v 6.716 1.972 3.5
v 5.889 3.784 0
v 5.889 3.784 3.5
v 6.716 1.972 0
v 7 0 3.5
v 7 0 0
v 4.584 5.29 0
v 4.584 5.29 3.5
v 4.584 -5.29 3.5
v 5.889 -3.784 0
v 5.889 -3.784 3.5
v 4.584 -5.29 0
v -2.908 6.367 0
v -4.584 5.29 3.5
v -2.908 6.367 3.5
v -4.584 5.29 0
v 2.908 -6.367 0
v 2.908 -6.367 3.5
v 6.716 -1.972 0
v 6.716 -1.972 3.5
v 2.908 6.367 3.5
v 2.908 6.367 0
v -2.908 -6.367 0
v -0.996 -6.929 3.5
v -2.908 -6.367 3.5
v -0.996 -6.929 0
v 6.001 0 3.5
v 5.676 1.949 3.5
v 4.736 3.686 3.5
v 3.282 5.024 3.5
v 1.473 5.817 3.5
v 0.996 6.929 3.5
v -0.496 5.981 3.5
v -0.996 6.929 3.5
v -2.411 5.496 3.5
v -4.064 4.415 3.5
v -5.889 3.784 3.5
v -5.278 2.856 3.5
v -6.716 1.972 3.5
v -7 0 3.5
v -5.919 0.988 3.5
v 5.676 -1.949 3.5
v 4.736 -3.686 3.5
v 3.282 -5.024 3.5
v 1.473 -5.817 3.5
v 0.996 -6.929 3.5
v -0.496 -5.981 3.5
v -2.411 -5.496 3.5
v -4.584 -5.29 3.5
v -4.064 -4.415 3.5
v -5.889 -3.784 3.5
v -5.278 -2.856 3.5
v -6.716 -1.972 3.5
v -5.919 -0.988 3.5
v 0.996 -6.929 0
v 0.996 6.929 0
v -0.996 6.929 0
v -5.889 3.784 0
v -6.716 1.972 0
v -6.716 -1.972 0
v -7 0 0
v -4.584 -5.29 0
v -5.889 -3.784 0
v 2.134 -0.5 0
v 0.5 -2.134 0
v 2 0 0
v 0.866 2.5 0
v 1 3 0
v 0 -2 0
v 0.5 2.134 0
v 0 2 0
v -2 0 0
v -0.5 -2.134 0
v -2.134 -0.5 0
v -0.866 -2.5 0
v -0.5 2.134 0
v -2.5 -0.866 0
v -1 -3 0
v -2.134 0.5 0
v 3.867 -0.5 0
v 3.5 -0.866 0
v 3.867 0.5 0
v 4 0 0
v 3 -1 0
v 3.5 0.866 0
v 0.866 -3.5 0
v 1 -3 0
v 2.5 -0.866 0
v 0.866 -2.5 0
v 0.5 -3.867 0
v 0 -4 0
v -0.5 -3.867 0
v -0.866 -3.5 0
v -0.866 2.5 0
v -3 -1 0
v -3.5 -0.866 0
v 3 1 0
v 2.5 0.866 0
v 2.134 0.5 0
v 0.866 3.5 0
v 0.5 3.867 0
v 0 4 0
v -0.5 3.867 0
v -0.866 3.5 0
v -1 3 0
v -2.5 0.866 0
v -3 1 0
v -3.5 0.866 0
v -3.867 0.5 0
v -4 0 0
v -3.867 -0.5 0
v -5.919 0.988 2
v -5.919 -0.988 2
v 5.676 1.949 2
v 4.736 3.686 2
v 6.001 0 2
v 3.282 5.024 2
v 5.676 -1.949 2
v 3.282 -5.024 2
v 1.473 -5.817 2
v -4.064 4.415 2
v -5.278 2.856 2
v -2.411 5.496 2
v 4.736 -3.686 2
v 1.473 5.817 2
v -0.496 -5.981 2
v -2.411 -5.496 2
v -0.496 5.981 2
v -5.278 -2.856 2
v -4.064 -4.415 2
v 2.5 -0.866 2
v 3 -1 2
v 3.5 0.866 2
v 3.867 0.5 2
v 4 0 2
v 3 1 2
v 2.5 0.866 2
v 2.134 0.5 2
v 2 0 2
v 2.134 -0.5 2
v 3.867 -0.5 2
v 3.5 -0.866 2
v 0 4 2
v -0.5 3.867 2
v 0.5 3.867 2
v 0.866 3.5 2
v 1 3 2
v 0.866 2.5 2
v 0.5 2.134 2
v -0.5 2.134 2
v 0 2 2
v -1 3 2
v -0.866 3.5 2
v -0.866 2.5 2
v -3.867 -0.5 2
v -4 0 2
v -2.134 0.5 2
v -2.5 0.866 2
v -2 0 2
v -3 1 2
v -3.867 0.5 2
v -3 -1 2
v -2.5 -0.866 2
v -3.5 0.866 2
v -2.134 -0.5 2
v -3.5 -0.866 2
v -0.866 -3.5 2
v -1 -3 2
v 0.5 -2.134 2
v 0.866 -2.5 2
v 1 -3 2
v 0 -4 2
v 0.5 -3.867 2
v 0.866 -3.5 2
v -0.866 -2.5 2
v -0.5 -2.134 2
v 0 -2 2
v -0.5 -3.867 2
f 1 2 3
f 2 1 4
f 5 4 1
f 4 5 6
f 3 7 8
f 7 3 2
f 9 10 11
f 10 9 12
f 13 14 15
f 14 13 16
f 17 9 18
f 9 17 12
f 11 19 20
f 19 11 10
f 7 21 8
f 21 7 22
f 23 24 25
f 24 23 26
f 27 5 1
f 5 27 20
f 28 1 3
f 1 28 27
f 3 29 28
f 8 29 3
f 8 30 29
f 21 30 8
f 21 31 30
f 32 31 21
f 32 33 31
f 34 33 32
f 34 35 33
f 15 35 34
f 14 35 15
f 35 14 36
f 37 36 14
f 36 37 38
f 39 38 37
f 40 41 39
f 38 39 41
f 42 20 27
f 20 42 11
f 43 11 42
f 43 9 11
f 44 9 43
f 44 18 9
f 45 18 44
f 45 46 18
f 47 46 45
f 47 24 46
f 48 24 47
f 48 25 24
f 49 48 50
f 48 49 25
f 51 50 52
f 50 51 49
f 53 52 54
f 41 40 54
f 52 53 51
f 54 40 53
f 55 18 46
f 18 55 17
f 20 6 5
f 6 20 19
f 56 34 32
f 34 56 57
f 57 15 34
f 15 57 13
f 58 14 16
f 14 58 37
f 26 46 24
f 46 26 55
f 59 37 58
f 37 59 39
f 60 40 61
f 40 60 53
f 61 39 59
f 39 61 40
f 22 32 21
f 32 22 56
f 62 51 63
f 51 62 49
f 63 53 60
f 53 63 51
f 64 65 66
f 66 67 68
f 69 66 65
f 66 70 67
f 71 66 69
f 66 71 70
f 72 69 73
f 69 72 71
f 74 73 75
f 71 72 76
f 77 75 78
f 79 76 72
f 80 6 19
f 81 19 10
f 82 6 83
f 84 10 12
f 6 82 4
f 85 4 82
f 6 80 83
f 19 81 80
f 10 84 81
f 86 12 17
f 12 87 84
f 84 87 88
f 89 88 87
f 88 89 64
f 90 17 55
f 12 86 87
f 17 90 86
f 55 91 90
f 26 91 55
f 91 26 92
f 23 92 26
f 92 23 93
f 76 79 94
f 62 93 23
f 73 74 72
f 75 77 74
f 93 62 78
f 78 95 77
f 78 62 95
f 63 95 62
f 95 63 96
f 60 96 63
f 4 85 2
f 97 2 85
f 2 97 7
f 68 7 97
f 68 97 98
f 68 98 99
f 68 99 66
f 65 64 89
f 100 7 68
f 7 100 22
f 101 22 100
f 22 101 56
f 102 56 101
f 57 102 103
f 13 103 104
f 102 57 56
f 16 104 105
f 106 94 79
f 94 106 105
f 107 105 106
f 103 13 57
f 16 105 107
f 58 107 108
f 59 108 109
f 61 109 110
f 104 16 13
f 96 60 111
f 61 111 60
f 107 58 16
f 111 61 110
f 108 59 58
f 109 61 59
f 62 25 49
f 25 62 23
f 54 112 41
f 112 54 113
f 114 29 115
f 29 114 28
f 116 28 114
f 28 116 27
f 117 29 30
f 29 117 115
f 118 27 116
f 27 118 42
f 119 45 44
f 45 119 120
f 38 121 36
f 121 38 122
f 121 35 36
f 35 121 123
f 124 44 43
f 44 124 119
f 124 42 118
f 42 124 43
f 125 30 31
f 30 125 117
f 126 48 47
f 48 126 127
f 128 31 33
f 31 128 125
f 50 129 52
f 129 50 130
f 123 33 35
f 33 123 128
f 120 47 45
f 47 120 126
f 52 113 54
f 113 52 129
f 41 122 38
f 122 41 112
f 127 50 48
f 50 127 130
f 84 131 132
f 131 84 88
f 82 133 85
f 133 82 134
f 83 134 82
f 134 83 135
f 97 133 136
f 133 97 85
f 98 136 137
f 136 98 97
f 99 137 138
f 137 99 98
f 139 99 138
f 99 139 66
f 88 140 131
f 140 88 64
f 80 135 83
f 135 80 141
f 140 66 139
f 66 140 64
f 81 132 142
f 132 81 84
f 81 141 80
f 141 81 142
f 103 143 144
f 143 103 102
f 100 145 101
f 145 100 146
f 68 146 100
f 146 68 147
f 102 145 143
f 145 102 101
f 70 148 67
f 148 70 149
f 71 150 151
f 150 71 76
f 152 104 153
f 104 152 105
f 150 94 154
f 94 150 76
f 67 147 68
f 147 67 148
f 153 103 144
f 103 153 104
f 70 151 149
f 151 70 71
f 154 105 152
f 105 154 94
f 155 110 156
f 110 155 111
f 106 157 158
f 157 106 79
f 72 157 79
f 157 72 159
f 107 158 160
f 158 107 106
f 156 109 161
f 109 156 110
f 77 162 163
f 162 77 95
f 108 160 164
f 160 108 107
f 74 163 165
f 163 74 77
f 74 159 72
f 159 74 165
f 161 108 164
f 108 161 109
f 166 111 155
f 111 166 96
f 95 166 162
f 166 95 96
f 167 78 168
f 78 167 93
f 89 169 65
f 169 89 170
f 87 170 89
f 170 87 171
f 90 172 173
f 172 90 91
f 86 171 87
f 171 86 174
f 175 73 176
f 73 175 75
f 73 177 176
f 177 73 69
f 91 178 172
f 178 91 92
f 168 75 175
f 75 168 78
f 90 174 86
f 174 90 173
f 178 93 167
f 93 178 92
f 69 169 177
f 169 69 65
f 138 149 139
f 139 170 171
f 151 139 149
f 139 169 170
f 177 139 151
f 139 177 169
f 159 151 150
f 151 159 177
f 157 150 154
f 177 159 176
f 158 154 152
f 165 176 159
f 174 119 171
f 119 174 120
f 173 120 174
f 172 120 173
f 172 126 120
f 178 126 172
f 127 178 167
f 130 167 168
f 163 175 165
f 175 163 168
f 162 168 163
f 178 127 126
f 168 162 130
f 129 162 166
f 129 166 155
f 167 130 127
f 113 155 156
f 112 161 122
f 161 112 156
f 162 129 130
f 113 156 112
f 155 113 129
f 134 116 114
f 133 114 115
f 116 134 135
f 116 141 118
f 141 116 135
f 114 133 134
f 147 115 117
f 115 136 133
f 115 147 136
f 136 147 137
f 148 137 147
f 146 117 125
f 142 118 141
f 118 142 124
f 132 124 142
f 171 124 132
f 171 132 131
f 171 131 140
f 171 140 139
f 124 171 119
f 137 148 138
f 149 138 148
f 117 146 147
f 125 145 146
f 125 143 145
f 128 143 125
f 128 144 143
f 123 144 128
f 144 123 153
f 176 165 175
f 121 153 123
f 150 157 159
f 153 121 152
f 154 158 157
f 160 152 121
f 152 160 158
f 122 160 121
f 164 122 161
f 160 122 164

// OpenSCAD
/* [Button] */
// How thick should the button be in the center? (mm)
buttonThickness = 2; // [2:2.0 millimetres,2.5:2.5 millimetres,3:3.0 millimetres,5:5.0 millimetres,10:10 millimetres]

// What is the distance from one side of the button to the other? (mm)
buttonDiameter = 14; // [7:40]

// How wide should the trim around the button be? (mm)
buttonTrimThickness = 2; // [0:39]

// How far off of the top of the button should the trim stand? (mm)
buttonTrimHeight = 1.5; // [1.5:1.5 millimetres,2:2.0 millimetres,2.5:2.5 millimetres,3:3.0 millimetres]

/* [Threadholes] */
// How many threadholes should the button have?
holeCount = 4; // [0:8]

// How far from the centre should the threadholes be (fraction out of 10)?
holeDistanceToCentre = 5; // [0:10]

// How big should each threadhole be? (mm)
holeSize = 2; // [1:6]

// END OF CUSTOMIZER VARIABLES

innerDiameter = buttonDiameter - (buttonTrimThickness-0.001 * 2);	// Used to line things up so they won't collide with the trim

// Lays out the  cylinders that will be used to form the threadholes
module holes() {	
	if ( (holeCount > 0) && (holeCount != 1) ) {	// Avoid a divide-by-zero error
		rotationDegrees = 360 / holeCount;	// This places the holes equally around the centre
		
		for(currentRotation = [0 : rotationDegrees : 359]) {	// Stop at 359 degrees, because 360 degrees is coterminal to 0 degrees
			singleHole( ((holeDistanceToCentre * .05) * innerDiameter * cos(currentRotation)),
				((holeDistanceToCentre * .05) * innerDiameter * sin(currentRotation)) );
			
			/*	Multiplying by .05 makes the distance to centre a fraction of 1, and then divides it by two (diameter to radius)
				The x coordinate is found by multiplying the sine of the current angle by the distance from the centre
				The y coordinate is found the same way, except using the cosine instead of the sine. */
		}
	} else if ( (holeCount > 0) && (holeCount == 1) ) {
		singleHole(0, 0);	// If there's only one hole, just put it in the middle
	}
}

// Defines a single threadhole cylinder; used in holes()
module singleHole(x, y) {
	translate([x,y,0]) cylinder(h=(buttonThickness + buttonTrimHeight) * 3, d=holeSize, center=true, $fn=12);
}

// The button, minus the trim
module buttonInnerDisc() {
	difference() {
		cylinder(h=buttonThickness, d=innerDiameter);
		holes();
	}
}

// Just the trim for the button
module buttonTrim() {
	difference() {
		cylinder(h=buttonThickness + buttonTrimHeight, d=buttonDiameter);
		cylinder(h=buttonThickness * 4, d=innerDiameter, center=true);
	}
}

// Compile everything together and make the final button
module makeButton() {
	buttonTrim();
	buttonInnerDisc();
}

makeButton();
